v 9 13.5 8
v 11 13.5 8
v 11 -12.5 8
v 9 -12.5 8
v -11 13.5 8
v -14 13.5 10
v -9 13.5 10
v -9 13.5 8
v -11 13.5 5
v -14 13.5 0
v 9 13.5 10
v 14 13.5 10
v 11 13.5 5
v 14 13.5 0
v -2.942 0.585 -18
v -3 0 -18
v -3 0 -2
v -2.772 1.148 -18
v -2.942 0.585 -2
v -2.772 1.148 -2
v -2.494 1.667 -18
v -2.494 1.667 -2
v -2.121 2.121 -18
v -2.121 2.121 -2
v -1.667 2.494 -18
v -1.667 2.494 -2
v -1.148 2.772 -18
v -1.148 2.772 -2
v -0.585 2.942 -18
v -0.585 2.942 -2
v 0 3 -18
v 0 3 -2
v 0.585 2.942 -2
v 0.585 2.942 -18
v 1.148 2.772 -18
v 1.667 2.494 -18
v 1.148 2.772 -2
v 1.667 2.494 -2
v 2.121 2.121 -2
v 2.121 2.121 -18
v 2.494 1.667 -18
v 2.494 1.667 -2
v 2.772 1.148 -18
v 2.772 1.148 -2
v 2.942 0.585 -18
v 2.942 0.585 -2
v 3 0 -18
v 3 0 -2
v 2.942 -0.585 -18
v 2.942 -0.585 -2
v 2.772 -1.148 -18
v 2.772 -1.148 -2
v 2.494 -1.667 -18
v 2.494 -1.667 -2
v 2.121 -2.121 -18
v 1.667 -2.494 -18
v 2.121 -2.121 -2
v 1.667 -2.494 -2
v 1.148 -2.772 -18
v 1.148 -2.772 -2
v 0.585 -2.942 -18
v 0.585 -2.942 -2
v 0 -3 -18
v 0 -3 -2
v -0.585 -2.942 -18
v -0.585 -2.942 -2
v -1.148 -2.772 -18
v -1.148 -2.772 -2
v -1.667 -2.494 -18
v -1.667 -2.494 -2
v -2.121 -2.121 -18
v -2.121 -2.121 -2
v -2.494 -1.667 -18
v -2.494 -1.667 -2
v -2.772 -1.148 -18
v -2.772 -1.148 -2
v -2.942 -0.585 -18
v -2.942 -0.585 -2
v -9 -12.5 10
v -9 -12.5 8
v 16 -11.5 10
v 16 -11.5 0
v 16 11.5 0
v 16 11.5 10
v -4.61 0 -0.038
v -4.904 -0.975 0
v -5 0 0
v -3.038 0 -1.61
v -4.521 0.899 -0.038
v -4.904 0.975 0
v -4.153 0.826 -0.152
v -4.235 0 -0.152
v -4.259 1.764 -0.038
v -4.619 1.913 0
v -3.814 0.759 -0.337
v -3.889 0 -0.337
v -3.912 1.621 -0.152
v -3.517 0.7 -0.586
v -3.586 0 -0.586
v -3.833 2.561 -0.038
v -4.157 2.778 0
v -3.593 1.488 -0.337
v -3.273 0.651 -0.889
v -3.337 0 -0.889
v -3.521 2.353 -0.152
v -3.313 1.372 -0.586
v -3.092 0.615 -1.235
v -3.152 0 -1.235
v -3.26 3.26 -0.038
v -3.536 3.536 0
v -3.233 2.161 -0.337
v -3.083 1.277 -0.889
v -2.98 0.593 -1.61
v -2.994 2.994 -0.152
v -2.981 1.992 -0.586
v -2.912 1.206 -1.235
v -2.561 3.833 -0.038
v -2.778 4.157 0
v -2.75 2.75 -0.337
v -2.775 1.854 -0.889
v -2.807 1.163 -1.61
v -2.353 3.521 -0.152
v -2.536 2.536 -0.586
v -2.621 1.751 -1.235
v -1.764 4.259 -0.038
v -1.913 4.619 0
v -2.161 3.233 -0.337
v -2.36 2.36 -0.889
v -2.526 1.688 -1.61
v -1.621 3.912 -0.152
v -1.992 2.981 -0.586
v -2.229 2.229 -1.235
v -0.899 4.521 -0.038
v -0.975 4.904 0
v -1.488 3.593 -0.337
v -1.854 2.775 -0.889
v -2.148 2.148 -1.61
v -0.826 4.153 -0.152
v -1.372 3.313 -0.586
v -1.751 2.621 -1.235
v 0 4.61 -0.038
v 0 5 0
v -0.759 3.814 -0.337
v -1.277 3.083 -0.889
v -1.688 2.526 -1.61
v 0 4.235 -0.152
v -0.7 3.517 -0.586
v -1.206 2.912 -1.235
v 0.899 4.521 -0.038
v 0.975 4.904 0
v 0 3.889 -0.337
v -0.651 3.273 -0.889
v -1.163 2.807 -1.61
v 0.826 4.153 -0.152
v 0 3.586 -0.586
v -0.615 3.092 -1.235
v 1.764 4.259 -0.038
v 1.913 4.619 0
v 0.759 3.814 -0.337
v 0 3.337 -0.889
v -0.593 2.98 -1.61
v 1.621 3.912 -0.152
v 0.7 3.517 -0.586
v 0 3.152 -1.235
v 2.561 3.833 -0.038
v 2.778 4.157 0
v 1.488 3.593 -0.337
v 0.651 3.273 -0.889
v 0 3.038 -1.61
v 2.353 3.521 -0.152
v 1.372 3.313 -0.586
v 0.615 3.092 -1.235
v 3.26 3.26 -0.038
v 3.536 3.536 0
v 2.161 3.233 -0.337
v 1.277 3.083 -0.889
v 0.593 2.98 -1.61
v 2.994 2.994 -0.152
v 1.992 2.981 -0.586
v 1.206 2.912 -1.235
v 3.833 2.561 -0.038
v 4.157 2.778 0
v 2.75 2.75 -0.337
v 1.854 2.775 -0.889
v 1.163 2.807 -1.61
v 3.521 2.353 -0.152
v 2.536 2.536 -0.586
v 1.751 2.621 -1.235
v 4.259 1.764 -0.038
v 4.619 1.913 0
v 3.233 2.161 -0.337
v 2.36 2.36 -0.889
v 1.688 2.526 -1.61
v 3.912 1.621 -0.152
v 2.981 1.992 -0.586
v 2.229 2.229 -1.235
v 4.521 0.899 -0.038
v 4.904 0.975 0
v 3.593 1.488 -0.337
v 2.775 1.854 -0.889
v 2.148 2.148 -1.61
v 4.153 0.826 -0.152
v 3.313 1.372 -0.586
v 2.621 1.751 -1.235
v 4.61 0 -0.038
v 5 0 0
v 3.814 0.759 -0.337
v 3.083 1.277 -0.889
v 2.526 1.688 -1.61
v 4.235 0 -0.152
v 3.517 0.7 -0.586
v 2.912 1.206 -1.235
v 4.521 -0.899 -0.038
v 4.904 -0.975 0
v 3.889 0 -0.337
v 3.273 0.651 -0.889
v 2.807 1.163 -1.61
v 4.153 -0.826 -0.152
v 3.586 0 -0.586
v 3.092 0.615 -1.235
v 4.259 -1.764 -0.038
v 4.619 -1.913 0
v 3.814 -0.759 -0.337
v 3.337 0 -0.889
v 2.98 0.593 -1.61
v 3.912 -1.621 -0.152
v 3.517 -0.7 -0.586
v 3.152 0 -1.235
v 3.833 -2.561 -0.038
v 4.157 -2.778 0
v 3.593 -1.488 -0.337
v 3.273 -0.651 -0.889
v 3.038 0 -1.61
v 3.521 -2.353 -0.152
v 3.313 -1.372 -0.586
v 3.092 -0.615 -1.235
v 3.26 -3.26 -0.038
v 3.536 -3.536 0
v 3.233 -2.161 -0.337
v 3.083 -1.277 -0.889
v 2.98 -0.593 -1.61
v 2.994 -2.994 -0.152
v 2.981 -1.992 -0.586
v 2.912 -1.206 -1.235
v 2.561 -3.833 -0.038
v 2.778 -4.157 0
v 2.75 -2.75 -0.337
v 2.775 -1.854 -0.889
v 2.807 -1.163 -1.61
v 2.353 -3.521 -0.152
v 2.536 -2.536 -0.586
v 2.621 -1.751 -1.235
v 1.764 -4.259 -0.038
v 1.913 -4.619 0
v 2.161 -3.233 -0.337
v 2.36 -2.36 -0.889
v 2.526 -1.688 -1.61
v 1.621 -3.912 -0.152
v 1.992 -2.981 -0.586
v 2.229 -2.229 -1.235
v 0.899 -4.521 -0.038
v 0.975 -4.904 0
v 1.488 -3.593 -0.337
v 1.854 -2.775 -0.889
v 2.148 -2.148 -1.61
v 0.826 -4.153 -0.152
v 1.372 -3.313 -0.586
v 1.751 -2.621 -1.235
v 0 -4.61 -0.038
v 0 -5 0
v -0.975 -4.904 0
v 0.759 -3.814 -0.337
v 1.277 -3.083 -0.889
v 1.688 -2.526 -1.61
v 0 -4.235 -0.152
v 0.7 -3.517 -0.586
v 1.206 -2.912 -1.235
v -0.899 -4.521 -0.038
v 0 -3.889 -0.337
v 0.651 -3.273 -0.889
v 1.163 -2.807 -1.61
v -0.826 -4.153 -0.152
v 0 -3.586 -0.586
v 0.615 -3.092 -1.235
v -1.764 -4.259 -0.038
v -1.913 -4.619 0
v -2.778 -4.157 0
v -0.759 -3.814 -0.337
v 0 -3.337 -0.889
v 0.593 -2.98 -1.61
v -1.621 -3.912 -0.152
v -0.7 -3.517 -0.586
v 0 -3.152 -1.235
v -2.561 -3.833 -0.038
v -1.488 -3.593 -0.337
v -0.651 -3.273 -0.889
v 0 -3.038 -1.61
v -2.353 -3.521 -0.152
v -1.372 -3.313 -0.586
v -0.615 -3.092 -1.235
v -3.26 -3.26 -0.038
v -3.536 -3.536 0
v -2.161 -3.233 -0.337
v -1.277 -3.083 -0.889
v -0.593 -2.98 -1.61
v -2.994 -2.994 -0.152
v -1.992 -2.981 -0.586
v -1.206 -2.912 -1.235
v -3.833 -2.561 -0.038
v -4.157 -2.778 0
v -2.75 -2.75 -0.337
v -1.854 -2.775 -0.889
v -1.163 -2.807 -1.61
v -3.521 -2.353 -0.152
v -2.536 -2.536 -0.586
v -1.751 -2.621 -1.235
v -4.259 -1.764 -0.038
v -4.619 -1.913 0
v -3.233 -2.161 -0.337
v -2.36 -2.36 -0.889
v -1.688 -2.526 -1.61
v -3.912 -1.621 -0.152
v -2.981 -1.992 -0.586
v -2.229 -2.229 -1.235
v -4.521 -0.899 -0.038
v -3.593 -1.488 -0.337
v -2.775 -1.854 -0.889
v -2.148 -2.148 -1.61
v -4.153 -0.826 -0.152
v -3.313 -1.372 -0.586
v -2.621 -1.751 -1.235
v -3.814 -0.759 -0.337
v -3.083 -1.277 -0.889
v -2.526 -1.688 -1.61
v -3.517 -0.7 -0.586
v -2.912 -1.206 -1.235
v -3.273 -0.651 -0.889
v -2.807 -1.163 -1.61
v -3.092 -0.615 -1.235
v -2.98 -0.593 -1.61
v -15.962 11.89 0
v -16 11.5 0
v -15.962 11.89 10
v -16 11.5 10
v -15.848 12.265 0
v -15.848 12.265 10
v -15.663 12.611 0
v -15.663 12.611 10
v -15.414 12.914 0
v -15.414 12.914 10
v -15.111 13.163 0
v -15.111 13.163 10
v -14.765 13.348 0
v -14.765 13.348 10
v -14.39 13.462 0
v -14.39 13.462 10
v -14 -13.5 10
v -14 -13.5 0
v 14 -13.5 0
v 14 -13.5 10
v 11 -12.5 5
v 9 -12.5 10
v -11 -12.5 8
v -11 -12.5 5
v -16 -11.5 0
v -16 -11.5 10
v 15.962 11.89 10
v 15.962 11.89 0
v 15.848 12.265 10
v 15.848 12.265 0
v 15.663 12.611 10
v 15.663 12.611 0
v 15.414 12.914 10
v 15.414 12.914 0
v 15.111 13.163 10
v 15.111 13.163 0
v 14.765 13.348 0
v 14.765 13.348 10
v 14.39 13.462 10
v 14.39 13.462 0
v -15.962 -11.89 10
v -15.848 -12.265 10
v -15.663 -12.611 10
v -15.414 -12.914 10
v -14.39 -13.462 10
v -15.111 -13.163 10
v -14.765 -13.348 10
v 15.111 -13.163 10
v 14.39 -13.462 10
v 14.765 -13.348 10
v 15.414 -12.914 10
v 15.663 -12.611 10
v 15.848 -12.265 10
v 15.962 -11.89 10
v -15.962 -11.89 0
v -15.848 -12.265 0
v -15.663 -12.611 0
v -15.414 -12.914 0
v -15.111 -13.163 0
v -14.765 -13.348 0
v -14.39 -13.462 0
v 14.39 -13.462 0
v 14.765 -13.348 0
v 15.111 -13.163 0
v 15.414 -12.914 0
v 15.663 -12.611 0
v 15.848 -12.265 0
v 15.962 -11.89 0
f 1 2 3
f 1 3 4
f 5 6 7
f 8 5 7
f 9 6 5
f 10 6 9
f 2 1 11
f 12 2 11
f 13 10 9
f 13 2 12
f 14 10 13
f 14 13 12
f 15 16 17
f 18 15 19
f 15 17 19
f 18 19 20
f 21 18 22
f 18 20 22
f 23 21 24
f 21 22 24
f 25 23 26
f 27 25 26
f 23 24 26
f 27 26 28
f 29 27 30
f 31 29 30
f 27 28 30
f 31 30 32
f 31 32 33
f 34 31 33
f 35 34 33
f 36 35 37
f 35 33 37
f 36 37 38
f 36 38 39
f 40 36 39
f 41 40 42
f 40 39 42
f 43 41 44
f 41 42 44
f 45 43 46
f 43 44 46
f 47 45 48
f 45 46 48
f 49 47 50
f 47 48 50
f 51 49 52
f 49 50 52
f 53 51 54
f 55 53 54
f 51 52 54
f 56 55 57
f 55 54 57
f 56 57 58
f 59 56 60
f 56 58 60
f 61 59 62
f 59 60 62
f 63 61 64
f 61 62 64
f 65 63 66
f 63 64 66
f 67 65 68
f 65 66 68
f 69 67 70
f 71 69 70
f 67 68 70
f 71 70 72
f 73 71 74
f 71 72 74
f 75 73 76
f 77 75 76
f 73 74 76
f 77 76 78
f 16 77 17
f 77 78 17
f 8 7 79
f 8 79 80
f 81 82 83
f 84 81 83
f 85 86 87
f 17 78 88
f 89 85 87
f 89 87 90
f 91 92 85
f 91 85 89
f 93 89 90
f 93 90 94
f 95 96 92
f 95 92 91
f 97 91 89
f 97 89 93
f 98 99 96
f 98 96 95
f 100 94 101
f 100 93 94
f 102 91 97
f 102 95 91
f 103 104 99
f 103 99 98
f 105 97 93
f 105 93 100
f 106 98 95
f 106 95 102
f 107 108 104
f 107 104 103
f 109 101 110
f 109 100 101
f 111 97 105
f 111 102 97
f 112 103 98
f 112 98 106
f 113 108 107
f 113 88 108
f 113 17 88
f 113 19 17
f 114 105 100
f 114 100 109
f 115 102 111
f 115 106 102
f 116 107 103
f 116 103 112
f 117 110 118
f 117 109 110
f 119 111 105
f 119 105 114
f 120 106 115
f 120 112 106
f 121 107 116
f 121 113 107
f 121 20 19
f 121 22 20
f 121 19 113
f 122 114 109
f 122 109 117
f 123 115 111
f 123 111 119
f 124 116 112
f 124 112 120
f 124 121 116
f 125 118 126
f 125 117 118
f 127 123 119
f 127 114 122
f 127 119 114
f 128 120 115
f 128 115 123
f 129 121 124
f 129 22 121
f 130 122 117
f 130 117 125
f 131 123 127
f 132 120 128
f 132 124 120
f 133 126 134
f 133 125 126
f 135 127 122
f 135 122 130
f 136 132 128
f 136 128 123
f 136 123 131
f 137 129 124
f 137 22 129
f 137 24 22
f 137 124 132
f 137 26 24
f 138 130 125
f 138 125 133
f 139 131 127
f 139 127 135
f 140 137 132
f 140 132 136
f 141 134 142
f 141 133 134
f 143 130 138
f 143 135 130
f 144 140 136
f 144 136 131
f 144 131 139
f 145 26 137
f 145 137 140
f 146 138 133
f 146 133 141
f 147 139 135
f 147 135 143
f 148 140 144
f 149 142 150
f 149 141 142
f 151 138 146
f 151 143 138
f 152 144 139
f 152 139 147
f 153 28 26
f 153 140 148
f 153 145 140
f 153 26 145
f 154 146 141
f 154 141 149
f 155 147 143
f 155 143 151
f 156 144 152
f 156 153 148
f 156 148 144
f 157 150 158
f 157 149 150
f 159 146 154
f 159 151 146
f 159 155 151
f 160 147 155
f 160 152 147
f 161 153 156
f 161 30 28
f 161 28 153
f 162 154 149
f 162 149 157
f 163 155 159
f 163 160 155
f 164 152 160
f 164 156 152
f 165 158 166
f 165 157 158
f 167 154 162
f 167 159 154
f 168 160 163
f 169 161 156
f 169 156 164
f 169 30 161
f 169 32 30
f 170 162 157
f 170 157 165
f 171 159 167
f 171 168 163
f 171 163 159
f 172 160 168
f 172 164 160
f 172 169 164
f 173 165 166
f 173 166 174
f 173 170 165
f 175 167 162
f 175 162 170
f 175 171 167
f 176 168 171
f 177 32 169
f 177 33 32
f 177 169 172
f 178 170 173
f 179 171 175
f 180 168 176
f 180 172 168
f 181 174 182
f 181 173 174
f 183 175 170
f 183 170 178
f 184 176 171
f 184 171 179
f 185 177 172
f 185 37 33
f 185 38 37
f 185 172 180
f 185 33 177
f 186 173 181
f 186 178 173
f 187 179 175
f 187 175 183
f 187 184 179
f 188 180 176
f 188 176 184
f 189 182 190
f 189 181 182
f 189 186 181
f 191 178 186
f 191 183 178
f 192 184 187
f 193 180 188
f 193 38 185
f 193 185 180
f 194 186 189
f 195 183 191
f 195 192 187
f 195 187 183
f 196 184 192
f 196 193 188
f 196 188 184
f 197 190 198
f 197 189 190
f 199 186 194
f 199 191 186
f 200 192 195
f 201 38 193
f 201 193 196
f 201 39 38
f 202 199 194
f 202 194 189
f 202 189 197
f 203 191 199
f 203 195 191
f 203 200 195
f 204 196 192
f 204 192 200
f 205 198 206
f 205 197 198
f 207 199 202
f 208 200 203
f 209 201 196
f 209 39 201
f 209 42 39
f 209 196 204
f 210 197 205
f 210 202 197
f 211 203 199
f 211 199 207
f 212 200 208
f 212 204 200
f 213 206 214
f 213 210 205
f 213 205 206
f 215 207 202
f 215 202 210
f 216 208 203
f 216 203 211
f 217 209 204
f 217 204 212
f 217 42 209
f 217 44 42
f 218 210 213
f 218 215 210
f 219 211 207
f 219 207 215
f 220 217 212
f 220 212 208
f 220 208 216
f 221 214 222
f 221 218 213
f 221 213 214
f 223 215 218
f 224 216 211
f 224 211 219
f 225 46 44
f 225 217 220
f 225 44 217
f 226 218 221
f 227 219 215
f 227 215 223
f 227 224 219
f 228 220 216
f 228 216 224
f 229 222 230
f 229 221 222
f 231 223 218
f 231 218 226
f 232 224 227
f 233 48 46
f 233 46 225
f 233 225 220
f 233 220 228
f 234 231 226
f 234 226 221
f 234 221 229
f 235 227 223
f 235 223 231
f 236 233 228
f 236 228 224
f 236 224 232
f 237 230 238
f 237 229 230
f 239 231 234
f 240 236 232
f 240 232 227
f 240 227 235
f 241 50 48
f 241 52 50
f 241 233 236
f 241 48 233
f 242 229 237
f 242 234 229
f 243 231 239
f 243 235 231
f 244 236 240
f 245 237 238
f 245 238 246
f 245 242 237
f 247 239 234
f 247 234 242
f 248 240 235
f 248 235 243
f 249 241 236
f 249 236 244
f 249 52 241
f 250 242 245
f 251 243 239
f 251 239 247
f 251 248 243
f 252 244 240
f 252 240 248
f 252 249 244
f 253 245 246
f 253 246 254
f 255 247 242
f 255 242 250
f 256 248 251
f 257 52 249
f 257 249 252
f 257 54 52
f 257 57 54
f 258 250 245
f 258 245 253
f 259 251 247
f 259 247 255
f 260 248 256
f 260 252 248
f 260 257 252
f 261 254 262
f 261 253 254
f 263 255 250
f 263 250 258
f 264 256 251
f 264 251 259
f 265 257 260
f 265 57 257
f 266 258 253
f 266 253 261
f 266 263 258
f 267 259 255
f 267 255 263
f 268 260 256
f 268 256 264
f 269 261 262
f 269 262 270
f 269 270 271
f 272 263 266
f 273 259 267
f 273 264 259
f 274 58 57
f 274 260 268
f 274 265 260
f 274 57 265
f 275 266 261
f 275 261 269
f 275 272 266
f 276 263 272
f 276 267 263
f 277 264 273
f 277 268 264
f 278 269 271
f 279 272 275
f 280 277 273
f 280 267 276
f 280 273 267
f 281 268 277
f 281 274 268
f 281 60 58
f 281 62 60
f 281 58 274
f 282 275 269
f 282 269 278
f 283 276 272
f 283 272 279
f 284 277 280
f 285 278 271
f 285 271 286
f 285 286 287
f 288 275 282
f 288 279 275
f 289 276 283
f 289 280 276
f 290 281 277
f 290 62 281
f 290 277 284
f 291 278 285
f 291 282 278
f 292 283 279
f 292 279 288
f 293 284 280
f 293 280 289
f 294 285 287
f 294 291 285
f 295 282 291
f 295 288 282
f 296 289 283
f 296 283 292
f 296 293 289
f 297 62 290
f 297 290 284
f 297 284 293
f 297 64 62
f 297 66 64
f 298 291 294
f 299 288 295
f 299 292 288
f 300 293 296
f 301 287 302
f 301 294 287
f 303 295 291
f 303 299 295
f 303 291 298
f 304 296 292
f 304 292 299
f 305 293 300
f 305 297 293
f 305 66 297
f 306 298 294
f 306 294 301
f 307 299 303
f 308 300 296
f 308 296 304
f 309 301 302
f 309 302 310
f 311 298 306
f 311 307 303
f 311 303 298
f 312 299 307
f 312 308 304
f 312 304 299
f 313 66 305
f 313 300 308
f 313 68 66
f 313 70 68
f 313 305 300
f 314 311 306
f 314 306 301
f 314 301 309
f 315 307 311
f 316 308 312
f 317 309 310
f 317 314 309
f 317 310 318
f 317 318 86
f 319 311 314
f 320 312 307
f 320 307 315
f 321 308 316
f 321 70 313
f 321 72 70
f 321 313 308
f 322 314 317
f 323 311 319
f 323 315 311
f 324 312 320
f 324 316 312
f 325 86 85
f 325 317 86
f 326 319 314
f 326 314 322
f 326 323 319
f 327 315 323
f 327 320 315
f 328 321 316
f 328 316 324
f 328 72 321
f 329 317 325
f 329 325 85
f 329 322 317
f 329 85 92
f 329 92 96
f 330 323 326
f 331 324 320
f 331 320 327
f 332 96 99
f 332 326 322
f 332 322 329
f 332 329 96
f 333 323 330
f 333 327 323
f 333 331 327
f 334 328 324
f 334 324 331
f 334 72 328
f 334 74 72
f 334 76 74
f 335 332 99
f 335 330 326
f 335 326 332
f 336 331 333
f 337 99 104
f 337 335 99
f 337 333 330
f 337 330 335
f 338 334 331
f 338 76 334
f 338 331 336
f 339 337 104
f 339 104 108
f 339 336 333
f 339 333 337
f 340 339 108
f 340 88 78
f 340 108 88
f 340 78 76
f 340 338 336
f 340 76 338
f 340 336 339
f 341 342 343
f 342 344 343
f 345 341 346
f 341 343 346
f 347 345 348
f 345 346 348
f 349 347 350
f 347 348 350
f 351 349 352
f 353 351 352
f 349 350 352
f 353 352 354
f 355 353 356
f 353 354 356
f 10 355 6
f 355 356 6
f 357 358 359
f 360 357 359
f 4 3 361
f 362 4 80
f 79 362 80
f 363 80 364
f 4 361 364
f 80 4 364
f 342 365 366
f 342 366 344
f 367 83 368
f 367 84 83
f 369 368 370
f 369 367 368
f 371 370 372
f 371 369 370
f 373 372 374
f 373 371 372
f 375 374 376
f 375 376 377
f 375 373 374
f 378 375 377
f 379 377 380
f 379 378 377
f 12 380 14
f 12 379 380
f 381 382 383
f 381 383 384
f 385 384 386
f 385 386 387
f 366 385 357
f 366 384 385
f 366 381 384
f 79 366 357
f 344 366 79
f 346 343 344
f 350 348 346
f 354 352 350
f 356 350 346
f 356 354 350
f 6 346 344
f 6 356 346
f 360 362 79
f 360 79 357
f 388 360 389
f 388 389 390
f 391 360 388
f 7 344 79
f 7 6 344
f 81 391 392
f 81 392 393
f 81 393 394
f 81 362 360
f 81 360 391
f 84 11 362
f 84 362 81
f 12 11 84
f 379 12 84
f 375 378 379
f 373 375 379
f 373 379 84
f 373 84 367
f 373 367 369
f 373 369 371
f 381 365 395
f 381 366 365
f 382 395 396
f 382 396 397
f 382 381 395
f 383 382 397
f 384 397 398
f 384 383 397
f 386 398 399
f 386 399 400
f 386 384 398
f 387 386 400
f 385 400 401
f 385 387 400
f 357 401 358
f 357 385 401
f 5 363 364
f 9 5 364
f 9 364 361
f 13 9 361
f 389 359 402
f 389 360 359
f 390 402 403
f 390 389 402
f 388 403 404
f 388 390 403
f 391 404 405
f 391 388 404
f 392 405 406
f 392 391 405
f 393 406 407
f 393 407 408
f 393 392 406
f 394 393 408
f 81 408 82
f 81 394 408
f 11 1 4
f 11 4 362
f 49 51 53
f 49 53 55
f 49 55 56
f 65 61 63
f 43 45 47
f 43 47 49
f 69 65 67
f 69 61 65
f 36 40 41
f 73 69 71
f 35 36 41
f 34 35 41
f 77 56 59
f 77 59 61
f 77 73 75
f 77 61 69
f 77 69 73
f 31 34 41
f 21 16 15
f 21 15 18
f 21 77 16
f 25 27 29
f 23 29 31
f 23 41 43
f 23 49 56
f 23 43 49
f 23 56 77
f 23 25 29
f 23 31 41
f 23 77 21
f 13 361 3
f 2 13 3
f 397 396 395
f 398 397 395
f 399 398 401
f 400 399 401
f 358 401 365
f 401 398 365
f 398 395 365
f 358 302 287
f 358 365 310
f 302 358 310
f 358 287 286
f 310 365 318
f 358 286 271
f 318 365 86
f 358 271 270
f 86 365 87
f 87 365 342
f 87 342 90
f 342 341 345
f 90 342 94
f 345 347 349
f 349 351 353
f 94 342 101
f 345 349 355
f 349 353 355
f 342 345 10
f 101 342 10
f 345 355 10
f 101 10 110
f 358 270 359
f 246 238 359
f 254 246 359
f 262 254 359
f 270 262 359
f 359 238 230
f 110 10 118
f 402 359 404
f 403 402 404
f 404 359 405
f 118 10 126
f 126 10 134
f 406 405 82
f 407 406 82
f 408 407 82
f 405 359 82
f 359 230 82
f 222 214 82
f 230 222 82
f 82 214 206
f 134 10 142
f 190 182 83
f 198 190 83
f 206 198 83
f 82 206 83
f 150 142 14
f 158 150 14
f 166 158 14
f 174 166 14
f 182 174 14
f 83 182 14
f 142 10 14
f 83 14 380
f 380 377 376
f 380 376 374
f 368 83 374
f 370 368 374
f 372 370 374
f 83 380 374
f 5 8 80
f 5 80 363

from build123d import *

# Parameters (mm, degrees)
SKETCH1_W           = 32
SKETCH1_H           = 27
BOSS_EXTRUDE1_DEPTH = 10
FILLET1_R           = 2
CUT_EXTRUDE4_DEPTH  = 26
SKETCH4_R           = 3
BOSS_EXTRUDE2_DEPTH = 18
FILLET2_R           = 2


with BuildPart() as part:
    # Sketch1 → Boss-Extrude1 (new body)
    with BuildSketch(Plane.XY):
        Rectangle(SKETCH1_W, SKETCH1_H)
    extrude(amount=BOSS_EXTRUDE1_DEPTH)

    # Fillet1
    fillet1_edges = [part.edges().sort_by_distance(p)[0] for p in [
        (-16, -13.5, 5),
        (16, -13.5, 5),
        (16, 13.5, 5),
        (-16, 13.5, 5),
    ]]
    fillet(fillet1_edges, radius=FILLET1_R)

    # Sketch2 → Cut-Extrude4 (cut)
    with BuildSketch(Plane(origin=(0, 13.5, 0), x_dir=(1, 0, 0), z_dir=(0, 1, 0))):
        Polygon((-9, -10), (-9, -8), (-11, -8), (-11, -5), (11, -5), (11, -8), (9, -8), (9, -10), align=None)
    extrude(amount=-CUT_EXTRUDE4_DEPTH, mode=Mode.SUBTRACT)

    # Sketch4 → Boss-Extrude2 (add)
    with BuildSketch(Plane(origin=(0, 0, 0), x_dir=(-1, 0, 0), z_dir=(0, 0, -1))):
        Circle(SKETCH4_R)
    extrude(amount=BOSS_EXTRUDE2_DEPTH)

    # Fillet2
    fillet2_edges = [part.edges().sort_by_distance(p)[0] for p in [
        (3, 0, 0),
    ]]
    fillet(fillet2_edges, radius=FILLET2_R)


solid = part.part
